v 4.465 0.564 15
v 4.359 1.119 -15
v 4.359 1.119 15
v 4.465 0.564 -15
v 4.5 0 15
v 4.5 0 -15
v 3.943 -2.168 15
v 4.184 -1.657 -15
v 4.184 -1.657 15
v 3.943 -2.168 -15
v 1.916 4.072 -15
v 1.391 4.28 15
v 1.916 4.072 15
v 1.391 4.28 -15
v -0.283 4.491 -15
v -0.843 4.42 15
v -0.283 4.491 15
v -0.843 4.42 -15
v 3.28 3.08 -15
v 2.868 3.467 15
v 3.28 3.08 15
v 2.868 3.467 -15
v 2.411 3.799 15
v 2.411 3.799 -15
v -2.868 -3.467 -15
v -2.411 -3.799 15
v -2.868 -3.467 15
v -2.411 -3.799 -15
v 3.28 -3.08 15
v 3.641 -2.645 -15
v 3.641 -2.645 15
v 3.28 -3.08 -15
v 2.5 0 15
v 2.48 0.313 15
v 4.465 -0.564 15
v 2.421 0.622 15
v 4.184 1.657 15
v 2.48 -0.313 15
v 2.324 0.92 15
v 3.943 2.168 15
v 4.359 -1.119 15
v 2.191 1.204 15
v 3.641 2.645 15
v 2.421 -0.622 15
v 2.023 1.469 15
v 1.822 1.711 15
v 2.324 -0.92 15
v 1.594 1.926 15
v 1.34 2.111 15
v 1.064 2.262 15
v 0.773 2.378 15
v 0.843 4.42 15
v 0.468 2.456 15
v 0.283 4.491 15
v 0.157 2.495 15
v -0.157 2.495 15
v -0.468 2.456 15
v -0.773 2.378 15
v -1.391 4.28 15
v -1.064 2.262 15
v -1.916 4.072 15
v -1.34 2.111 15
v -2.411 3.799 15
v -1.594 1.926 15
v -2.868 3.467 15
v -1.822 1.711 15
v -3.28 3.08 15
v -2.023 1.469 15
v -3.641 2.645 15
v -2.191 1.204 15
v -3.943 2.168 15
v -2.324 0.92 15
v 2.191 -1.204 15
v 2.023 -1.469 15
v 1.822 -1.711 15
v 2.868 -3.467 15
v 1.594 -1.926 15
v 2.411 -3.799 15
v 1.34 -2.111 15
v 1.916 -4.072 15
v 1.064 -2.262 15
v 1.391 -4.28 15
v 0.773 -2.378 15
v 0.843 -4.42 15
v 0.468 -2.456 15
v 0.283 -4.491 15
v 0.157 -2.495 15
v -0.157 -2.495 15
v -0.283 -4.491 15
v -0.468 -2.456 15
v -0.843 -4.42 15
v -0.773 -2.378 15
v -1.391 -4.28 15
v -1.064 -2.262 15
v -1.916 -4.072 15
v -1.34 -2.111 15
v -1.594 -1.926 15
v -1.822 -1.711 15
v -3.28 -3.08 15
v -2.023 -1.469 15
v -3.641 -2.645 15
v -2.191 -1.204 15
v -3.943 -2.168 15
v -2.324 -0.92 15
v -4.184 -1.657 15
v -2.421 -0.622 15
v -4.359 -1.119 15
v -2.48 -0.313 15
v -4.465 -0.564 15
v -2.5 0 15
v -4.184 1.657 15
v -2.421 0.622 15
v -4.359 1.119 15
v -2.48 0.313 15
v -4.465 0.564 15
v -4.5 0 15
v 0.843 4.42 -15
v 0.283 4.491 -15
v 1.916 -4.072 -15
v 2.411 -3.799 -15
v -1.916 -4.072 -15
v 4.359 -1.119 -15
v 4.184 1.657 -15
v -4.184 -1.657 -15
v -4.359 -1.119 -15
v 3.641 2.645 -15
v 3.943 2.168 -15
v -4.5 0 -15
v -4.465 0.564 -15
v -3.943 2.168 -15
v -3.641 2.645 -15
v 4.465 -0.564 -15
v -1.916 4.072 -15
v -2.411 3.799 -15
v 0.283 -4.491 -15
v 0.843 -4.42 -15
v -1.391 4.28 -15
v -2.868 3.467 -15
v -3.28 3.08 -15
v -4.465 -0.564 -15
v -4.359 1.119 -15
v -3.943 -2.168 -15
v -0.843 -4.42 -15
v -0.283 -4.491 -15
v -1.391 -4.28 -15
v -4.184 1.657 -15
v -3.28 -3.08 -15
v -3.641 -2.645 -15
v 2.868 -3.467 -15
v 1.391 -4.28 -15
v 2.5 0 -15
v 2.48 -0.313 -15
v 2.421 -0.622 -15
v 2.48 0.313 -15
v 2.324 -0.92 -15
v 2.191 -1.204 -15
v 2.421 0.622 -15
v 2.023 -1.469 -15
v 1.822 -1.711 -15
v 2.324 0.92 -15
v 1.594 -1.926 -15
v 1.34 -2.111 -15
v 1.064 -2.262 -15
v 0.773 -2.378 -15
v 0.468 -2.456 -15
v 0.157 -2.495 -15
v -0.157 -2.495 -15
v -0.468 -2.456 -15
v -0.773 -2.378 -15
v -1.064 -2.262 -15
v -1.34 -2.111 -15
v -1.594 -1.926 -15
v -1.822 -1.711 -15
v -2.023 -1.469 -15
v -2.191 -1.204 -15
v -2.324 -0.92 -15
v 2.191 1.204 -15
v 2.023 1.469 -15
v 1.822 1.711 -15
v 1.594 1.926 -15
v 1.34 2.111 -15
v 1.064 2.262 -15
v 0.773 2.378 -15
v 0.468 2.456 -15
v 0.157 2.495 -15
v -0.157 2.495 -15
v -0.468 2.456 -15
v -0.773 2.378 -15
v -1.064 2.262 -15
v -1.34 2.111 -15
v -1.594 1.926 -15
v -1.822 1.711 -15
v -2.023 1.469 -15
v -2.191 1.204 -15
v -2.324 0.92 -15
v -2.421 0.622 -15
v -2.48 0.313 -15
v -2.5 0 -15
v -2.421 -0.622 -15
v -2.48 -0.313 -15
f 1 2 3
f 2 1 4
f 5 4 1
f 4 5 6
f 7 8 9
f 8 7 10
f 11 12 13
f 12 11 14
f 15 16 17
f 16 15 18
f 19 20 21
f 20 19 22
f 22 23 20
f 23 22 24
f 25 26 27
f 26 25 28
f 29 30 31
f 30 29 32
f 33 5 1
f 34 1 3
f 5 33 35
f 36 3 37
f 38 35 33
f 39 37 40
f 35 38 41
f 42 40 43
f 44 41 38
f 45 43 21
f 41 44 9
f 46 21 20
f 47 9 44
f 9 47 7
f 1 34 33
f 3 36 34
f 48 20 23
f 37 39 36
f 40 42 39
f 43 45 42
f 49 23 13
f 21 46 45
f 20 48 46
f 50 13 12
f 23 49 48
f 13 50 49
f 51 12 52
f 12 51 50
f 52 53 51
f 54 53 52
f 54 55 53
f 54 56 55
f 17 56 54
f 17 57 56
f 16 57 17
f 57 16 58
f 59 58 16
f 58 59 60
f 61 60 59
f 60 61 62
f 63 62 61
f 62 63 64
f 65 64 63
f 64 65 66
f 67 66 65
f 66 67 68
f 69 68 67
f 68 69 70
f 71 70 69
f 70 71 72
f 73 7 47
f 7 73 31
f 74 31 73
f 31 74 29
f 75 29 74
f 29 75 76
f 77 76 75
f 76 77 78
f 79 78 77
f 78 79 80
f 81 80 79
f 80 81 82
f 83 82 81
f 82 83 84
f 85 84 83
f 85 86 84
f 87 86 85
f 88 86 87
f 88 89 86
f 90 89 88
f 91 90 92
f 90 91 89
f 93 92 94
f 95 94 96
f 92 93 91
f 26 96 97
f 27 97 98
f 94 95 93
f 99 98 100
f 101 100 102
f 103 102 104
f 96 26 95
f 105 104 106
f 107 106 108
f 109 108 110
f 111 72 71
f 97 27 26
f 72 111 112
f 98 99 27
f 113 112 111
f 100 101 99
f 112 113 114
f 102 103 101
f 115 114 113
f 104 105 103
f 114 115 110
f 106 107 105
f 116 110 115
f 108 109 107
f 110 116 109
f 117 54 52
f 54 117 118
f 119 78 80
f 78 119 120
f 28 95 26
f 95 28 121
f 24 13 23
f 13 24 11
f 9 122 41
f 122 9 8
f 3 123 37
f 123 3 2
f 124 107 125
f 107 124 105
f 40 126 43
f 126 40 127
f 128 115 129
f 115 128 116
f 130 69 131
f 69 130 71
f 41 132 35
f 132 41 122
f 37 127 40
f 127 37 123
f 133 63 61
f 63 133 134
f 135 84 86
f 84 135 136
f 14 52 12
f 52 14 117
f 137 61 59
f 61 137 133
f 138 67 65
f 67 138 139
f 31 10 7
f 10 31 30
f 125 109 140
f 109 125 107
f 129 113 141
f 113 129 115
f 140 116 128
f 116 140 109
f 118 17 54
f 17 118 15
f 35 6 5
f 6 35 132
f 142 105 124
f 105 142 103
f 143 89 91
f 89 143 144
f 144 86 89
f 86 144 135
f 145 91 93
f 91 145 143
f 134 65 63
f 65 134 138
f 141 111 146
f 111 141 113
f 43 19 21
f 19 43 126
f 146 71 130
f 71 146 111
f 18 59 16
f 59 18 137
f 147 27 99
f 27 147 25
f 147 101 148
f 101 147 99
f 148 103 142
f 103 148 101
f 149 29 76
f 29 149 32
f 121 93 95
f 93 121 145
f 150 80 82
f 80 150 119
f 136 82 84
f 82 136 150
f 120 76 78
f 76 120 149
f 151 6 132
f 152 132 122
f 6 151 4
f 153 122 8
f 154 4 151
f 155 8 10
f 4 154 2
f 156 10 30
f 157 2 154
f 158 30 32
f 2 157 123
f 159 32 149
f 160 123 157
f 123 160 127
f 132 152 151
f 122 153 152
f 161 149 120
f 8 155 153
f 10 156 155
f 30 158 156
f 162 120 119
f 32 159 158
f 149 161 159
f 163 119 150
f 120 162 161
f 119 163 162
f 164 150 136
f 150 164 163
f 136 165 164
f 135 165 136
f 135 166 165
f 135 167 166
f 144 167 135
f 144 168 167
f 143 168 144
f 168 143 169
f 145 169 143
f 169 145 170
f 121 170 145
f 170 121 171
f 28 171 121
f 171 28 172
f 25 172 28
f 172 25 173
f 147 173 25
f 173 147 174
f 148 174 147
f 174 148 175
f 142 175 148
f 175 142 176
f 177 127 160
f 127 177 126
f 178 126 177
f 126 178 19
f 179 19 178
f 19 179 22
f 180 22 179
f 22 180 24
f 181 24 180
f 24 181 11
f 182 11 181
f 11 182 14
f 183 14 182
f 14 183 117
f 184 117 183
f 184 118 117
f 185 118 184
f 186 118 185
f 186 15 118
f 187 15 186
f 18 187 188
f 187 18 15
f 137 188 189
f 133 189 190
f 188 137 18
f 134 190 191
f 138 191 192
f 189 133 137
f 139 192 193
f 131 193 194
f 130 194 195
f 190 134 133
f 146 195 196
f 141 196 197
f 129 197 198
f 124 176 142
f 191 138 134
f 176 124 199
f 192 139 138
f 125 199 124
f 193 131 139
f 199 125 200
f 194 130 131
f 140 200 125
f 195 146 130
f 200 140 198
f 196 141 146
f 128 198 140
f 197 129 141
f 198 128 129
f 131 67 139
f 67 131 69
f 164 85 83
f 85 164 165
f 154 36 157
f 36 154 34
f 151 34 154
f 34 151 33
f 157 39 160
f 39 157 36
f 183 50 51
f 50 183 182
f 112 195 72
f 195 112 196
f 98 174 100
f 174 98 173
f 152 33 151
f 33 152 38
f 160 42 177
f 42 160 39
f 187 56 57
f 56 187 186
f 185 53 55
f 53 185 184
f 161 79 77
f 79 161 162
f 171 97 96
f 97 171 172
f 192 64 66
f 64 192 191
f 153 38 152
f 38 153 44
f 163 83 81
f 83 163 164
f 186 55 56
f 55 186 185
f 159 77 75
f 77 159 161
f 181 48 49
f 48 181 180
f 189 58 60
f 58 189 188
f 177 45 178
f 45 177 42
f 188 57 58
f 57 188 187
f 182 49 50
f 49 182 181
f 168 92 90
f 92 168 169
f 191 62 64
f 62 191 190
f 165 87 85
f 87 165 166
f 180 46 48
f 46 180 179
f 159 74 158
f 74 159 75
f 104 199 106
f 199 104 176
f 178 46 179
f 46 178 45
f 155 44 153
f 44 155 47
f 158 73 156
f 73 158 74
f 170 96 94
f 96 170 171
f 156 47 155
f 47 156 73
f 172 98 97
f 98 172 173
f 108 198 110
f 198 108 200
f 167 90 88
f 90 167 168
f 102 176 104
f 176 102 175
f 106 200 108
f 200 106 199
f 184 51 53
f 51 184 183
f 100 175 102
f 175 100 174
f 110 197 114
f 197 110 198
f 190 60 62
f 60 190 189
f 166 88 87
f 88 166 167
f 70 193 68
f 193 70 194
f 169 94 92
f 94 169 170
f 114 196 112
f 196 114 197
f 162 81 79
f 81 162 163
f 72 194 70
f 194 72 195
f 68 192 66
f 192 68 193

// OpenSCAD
$fn = 50;


difference() {
	union() {
		translate(v = [0, 0, -15.0000000000]) {
			cylinder(h = 30, r = 4.5000000000);
		}
	}
	union() {
		translate(v = [0, 0, -100.0000000000]) {
			cylinder(h = 200, r = 2.5000000000);
		}
	}
}
